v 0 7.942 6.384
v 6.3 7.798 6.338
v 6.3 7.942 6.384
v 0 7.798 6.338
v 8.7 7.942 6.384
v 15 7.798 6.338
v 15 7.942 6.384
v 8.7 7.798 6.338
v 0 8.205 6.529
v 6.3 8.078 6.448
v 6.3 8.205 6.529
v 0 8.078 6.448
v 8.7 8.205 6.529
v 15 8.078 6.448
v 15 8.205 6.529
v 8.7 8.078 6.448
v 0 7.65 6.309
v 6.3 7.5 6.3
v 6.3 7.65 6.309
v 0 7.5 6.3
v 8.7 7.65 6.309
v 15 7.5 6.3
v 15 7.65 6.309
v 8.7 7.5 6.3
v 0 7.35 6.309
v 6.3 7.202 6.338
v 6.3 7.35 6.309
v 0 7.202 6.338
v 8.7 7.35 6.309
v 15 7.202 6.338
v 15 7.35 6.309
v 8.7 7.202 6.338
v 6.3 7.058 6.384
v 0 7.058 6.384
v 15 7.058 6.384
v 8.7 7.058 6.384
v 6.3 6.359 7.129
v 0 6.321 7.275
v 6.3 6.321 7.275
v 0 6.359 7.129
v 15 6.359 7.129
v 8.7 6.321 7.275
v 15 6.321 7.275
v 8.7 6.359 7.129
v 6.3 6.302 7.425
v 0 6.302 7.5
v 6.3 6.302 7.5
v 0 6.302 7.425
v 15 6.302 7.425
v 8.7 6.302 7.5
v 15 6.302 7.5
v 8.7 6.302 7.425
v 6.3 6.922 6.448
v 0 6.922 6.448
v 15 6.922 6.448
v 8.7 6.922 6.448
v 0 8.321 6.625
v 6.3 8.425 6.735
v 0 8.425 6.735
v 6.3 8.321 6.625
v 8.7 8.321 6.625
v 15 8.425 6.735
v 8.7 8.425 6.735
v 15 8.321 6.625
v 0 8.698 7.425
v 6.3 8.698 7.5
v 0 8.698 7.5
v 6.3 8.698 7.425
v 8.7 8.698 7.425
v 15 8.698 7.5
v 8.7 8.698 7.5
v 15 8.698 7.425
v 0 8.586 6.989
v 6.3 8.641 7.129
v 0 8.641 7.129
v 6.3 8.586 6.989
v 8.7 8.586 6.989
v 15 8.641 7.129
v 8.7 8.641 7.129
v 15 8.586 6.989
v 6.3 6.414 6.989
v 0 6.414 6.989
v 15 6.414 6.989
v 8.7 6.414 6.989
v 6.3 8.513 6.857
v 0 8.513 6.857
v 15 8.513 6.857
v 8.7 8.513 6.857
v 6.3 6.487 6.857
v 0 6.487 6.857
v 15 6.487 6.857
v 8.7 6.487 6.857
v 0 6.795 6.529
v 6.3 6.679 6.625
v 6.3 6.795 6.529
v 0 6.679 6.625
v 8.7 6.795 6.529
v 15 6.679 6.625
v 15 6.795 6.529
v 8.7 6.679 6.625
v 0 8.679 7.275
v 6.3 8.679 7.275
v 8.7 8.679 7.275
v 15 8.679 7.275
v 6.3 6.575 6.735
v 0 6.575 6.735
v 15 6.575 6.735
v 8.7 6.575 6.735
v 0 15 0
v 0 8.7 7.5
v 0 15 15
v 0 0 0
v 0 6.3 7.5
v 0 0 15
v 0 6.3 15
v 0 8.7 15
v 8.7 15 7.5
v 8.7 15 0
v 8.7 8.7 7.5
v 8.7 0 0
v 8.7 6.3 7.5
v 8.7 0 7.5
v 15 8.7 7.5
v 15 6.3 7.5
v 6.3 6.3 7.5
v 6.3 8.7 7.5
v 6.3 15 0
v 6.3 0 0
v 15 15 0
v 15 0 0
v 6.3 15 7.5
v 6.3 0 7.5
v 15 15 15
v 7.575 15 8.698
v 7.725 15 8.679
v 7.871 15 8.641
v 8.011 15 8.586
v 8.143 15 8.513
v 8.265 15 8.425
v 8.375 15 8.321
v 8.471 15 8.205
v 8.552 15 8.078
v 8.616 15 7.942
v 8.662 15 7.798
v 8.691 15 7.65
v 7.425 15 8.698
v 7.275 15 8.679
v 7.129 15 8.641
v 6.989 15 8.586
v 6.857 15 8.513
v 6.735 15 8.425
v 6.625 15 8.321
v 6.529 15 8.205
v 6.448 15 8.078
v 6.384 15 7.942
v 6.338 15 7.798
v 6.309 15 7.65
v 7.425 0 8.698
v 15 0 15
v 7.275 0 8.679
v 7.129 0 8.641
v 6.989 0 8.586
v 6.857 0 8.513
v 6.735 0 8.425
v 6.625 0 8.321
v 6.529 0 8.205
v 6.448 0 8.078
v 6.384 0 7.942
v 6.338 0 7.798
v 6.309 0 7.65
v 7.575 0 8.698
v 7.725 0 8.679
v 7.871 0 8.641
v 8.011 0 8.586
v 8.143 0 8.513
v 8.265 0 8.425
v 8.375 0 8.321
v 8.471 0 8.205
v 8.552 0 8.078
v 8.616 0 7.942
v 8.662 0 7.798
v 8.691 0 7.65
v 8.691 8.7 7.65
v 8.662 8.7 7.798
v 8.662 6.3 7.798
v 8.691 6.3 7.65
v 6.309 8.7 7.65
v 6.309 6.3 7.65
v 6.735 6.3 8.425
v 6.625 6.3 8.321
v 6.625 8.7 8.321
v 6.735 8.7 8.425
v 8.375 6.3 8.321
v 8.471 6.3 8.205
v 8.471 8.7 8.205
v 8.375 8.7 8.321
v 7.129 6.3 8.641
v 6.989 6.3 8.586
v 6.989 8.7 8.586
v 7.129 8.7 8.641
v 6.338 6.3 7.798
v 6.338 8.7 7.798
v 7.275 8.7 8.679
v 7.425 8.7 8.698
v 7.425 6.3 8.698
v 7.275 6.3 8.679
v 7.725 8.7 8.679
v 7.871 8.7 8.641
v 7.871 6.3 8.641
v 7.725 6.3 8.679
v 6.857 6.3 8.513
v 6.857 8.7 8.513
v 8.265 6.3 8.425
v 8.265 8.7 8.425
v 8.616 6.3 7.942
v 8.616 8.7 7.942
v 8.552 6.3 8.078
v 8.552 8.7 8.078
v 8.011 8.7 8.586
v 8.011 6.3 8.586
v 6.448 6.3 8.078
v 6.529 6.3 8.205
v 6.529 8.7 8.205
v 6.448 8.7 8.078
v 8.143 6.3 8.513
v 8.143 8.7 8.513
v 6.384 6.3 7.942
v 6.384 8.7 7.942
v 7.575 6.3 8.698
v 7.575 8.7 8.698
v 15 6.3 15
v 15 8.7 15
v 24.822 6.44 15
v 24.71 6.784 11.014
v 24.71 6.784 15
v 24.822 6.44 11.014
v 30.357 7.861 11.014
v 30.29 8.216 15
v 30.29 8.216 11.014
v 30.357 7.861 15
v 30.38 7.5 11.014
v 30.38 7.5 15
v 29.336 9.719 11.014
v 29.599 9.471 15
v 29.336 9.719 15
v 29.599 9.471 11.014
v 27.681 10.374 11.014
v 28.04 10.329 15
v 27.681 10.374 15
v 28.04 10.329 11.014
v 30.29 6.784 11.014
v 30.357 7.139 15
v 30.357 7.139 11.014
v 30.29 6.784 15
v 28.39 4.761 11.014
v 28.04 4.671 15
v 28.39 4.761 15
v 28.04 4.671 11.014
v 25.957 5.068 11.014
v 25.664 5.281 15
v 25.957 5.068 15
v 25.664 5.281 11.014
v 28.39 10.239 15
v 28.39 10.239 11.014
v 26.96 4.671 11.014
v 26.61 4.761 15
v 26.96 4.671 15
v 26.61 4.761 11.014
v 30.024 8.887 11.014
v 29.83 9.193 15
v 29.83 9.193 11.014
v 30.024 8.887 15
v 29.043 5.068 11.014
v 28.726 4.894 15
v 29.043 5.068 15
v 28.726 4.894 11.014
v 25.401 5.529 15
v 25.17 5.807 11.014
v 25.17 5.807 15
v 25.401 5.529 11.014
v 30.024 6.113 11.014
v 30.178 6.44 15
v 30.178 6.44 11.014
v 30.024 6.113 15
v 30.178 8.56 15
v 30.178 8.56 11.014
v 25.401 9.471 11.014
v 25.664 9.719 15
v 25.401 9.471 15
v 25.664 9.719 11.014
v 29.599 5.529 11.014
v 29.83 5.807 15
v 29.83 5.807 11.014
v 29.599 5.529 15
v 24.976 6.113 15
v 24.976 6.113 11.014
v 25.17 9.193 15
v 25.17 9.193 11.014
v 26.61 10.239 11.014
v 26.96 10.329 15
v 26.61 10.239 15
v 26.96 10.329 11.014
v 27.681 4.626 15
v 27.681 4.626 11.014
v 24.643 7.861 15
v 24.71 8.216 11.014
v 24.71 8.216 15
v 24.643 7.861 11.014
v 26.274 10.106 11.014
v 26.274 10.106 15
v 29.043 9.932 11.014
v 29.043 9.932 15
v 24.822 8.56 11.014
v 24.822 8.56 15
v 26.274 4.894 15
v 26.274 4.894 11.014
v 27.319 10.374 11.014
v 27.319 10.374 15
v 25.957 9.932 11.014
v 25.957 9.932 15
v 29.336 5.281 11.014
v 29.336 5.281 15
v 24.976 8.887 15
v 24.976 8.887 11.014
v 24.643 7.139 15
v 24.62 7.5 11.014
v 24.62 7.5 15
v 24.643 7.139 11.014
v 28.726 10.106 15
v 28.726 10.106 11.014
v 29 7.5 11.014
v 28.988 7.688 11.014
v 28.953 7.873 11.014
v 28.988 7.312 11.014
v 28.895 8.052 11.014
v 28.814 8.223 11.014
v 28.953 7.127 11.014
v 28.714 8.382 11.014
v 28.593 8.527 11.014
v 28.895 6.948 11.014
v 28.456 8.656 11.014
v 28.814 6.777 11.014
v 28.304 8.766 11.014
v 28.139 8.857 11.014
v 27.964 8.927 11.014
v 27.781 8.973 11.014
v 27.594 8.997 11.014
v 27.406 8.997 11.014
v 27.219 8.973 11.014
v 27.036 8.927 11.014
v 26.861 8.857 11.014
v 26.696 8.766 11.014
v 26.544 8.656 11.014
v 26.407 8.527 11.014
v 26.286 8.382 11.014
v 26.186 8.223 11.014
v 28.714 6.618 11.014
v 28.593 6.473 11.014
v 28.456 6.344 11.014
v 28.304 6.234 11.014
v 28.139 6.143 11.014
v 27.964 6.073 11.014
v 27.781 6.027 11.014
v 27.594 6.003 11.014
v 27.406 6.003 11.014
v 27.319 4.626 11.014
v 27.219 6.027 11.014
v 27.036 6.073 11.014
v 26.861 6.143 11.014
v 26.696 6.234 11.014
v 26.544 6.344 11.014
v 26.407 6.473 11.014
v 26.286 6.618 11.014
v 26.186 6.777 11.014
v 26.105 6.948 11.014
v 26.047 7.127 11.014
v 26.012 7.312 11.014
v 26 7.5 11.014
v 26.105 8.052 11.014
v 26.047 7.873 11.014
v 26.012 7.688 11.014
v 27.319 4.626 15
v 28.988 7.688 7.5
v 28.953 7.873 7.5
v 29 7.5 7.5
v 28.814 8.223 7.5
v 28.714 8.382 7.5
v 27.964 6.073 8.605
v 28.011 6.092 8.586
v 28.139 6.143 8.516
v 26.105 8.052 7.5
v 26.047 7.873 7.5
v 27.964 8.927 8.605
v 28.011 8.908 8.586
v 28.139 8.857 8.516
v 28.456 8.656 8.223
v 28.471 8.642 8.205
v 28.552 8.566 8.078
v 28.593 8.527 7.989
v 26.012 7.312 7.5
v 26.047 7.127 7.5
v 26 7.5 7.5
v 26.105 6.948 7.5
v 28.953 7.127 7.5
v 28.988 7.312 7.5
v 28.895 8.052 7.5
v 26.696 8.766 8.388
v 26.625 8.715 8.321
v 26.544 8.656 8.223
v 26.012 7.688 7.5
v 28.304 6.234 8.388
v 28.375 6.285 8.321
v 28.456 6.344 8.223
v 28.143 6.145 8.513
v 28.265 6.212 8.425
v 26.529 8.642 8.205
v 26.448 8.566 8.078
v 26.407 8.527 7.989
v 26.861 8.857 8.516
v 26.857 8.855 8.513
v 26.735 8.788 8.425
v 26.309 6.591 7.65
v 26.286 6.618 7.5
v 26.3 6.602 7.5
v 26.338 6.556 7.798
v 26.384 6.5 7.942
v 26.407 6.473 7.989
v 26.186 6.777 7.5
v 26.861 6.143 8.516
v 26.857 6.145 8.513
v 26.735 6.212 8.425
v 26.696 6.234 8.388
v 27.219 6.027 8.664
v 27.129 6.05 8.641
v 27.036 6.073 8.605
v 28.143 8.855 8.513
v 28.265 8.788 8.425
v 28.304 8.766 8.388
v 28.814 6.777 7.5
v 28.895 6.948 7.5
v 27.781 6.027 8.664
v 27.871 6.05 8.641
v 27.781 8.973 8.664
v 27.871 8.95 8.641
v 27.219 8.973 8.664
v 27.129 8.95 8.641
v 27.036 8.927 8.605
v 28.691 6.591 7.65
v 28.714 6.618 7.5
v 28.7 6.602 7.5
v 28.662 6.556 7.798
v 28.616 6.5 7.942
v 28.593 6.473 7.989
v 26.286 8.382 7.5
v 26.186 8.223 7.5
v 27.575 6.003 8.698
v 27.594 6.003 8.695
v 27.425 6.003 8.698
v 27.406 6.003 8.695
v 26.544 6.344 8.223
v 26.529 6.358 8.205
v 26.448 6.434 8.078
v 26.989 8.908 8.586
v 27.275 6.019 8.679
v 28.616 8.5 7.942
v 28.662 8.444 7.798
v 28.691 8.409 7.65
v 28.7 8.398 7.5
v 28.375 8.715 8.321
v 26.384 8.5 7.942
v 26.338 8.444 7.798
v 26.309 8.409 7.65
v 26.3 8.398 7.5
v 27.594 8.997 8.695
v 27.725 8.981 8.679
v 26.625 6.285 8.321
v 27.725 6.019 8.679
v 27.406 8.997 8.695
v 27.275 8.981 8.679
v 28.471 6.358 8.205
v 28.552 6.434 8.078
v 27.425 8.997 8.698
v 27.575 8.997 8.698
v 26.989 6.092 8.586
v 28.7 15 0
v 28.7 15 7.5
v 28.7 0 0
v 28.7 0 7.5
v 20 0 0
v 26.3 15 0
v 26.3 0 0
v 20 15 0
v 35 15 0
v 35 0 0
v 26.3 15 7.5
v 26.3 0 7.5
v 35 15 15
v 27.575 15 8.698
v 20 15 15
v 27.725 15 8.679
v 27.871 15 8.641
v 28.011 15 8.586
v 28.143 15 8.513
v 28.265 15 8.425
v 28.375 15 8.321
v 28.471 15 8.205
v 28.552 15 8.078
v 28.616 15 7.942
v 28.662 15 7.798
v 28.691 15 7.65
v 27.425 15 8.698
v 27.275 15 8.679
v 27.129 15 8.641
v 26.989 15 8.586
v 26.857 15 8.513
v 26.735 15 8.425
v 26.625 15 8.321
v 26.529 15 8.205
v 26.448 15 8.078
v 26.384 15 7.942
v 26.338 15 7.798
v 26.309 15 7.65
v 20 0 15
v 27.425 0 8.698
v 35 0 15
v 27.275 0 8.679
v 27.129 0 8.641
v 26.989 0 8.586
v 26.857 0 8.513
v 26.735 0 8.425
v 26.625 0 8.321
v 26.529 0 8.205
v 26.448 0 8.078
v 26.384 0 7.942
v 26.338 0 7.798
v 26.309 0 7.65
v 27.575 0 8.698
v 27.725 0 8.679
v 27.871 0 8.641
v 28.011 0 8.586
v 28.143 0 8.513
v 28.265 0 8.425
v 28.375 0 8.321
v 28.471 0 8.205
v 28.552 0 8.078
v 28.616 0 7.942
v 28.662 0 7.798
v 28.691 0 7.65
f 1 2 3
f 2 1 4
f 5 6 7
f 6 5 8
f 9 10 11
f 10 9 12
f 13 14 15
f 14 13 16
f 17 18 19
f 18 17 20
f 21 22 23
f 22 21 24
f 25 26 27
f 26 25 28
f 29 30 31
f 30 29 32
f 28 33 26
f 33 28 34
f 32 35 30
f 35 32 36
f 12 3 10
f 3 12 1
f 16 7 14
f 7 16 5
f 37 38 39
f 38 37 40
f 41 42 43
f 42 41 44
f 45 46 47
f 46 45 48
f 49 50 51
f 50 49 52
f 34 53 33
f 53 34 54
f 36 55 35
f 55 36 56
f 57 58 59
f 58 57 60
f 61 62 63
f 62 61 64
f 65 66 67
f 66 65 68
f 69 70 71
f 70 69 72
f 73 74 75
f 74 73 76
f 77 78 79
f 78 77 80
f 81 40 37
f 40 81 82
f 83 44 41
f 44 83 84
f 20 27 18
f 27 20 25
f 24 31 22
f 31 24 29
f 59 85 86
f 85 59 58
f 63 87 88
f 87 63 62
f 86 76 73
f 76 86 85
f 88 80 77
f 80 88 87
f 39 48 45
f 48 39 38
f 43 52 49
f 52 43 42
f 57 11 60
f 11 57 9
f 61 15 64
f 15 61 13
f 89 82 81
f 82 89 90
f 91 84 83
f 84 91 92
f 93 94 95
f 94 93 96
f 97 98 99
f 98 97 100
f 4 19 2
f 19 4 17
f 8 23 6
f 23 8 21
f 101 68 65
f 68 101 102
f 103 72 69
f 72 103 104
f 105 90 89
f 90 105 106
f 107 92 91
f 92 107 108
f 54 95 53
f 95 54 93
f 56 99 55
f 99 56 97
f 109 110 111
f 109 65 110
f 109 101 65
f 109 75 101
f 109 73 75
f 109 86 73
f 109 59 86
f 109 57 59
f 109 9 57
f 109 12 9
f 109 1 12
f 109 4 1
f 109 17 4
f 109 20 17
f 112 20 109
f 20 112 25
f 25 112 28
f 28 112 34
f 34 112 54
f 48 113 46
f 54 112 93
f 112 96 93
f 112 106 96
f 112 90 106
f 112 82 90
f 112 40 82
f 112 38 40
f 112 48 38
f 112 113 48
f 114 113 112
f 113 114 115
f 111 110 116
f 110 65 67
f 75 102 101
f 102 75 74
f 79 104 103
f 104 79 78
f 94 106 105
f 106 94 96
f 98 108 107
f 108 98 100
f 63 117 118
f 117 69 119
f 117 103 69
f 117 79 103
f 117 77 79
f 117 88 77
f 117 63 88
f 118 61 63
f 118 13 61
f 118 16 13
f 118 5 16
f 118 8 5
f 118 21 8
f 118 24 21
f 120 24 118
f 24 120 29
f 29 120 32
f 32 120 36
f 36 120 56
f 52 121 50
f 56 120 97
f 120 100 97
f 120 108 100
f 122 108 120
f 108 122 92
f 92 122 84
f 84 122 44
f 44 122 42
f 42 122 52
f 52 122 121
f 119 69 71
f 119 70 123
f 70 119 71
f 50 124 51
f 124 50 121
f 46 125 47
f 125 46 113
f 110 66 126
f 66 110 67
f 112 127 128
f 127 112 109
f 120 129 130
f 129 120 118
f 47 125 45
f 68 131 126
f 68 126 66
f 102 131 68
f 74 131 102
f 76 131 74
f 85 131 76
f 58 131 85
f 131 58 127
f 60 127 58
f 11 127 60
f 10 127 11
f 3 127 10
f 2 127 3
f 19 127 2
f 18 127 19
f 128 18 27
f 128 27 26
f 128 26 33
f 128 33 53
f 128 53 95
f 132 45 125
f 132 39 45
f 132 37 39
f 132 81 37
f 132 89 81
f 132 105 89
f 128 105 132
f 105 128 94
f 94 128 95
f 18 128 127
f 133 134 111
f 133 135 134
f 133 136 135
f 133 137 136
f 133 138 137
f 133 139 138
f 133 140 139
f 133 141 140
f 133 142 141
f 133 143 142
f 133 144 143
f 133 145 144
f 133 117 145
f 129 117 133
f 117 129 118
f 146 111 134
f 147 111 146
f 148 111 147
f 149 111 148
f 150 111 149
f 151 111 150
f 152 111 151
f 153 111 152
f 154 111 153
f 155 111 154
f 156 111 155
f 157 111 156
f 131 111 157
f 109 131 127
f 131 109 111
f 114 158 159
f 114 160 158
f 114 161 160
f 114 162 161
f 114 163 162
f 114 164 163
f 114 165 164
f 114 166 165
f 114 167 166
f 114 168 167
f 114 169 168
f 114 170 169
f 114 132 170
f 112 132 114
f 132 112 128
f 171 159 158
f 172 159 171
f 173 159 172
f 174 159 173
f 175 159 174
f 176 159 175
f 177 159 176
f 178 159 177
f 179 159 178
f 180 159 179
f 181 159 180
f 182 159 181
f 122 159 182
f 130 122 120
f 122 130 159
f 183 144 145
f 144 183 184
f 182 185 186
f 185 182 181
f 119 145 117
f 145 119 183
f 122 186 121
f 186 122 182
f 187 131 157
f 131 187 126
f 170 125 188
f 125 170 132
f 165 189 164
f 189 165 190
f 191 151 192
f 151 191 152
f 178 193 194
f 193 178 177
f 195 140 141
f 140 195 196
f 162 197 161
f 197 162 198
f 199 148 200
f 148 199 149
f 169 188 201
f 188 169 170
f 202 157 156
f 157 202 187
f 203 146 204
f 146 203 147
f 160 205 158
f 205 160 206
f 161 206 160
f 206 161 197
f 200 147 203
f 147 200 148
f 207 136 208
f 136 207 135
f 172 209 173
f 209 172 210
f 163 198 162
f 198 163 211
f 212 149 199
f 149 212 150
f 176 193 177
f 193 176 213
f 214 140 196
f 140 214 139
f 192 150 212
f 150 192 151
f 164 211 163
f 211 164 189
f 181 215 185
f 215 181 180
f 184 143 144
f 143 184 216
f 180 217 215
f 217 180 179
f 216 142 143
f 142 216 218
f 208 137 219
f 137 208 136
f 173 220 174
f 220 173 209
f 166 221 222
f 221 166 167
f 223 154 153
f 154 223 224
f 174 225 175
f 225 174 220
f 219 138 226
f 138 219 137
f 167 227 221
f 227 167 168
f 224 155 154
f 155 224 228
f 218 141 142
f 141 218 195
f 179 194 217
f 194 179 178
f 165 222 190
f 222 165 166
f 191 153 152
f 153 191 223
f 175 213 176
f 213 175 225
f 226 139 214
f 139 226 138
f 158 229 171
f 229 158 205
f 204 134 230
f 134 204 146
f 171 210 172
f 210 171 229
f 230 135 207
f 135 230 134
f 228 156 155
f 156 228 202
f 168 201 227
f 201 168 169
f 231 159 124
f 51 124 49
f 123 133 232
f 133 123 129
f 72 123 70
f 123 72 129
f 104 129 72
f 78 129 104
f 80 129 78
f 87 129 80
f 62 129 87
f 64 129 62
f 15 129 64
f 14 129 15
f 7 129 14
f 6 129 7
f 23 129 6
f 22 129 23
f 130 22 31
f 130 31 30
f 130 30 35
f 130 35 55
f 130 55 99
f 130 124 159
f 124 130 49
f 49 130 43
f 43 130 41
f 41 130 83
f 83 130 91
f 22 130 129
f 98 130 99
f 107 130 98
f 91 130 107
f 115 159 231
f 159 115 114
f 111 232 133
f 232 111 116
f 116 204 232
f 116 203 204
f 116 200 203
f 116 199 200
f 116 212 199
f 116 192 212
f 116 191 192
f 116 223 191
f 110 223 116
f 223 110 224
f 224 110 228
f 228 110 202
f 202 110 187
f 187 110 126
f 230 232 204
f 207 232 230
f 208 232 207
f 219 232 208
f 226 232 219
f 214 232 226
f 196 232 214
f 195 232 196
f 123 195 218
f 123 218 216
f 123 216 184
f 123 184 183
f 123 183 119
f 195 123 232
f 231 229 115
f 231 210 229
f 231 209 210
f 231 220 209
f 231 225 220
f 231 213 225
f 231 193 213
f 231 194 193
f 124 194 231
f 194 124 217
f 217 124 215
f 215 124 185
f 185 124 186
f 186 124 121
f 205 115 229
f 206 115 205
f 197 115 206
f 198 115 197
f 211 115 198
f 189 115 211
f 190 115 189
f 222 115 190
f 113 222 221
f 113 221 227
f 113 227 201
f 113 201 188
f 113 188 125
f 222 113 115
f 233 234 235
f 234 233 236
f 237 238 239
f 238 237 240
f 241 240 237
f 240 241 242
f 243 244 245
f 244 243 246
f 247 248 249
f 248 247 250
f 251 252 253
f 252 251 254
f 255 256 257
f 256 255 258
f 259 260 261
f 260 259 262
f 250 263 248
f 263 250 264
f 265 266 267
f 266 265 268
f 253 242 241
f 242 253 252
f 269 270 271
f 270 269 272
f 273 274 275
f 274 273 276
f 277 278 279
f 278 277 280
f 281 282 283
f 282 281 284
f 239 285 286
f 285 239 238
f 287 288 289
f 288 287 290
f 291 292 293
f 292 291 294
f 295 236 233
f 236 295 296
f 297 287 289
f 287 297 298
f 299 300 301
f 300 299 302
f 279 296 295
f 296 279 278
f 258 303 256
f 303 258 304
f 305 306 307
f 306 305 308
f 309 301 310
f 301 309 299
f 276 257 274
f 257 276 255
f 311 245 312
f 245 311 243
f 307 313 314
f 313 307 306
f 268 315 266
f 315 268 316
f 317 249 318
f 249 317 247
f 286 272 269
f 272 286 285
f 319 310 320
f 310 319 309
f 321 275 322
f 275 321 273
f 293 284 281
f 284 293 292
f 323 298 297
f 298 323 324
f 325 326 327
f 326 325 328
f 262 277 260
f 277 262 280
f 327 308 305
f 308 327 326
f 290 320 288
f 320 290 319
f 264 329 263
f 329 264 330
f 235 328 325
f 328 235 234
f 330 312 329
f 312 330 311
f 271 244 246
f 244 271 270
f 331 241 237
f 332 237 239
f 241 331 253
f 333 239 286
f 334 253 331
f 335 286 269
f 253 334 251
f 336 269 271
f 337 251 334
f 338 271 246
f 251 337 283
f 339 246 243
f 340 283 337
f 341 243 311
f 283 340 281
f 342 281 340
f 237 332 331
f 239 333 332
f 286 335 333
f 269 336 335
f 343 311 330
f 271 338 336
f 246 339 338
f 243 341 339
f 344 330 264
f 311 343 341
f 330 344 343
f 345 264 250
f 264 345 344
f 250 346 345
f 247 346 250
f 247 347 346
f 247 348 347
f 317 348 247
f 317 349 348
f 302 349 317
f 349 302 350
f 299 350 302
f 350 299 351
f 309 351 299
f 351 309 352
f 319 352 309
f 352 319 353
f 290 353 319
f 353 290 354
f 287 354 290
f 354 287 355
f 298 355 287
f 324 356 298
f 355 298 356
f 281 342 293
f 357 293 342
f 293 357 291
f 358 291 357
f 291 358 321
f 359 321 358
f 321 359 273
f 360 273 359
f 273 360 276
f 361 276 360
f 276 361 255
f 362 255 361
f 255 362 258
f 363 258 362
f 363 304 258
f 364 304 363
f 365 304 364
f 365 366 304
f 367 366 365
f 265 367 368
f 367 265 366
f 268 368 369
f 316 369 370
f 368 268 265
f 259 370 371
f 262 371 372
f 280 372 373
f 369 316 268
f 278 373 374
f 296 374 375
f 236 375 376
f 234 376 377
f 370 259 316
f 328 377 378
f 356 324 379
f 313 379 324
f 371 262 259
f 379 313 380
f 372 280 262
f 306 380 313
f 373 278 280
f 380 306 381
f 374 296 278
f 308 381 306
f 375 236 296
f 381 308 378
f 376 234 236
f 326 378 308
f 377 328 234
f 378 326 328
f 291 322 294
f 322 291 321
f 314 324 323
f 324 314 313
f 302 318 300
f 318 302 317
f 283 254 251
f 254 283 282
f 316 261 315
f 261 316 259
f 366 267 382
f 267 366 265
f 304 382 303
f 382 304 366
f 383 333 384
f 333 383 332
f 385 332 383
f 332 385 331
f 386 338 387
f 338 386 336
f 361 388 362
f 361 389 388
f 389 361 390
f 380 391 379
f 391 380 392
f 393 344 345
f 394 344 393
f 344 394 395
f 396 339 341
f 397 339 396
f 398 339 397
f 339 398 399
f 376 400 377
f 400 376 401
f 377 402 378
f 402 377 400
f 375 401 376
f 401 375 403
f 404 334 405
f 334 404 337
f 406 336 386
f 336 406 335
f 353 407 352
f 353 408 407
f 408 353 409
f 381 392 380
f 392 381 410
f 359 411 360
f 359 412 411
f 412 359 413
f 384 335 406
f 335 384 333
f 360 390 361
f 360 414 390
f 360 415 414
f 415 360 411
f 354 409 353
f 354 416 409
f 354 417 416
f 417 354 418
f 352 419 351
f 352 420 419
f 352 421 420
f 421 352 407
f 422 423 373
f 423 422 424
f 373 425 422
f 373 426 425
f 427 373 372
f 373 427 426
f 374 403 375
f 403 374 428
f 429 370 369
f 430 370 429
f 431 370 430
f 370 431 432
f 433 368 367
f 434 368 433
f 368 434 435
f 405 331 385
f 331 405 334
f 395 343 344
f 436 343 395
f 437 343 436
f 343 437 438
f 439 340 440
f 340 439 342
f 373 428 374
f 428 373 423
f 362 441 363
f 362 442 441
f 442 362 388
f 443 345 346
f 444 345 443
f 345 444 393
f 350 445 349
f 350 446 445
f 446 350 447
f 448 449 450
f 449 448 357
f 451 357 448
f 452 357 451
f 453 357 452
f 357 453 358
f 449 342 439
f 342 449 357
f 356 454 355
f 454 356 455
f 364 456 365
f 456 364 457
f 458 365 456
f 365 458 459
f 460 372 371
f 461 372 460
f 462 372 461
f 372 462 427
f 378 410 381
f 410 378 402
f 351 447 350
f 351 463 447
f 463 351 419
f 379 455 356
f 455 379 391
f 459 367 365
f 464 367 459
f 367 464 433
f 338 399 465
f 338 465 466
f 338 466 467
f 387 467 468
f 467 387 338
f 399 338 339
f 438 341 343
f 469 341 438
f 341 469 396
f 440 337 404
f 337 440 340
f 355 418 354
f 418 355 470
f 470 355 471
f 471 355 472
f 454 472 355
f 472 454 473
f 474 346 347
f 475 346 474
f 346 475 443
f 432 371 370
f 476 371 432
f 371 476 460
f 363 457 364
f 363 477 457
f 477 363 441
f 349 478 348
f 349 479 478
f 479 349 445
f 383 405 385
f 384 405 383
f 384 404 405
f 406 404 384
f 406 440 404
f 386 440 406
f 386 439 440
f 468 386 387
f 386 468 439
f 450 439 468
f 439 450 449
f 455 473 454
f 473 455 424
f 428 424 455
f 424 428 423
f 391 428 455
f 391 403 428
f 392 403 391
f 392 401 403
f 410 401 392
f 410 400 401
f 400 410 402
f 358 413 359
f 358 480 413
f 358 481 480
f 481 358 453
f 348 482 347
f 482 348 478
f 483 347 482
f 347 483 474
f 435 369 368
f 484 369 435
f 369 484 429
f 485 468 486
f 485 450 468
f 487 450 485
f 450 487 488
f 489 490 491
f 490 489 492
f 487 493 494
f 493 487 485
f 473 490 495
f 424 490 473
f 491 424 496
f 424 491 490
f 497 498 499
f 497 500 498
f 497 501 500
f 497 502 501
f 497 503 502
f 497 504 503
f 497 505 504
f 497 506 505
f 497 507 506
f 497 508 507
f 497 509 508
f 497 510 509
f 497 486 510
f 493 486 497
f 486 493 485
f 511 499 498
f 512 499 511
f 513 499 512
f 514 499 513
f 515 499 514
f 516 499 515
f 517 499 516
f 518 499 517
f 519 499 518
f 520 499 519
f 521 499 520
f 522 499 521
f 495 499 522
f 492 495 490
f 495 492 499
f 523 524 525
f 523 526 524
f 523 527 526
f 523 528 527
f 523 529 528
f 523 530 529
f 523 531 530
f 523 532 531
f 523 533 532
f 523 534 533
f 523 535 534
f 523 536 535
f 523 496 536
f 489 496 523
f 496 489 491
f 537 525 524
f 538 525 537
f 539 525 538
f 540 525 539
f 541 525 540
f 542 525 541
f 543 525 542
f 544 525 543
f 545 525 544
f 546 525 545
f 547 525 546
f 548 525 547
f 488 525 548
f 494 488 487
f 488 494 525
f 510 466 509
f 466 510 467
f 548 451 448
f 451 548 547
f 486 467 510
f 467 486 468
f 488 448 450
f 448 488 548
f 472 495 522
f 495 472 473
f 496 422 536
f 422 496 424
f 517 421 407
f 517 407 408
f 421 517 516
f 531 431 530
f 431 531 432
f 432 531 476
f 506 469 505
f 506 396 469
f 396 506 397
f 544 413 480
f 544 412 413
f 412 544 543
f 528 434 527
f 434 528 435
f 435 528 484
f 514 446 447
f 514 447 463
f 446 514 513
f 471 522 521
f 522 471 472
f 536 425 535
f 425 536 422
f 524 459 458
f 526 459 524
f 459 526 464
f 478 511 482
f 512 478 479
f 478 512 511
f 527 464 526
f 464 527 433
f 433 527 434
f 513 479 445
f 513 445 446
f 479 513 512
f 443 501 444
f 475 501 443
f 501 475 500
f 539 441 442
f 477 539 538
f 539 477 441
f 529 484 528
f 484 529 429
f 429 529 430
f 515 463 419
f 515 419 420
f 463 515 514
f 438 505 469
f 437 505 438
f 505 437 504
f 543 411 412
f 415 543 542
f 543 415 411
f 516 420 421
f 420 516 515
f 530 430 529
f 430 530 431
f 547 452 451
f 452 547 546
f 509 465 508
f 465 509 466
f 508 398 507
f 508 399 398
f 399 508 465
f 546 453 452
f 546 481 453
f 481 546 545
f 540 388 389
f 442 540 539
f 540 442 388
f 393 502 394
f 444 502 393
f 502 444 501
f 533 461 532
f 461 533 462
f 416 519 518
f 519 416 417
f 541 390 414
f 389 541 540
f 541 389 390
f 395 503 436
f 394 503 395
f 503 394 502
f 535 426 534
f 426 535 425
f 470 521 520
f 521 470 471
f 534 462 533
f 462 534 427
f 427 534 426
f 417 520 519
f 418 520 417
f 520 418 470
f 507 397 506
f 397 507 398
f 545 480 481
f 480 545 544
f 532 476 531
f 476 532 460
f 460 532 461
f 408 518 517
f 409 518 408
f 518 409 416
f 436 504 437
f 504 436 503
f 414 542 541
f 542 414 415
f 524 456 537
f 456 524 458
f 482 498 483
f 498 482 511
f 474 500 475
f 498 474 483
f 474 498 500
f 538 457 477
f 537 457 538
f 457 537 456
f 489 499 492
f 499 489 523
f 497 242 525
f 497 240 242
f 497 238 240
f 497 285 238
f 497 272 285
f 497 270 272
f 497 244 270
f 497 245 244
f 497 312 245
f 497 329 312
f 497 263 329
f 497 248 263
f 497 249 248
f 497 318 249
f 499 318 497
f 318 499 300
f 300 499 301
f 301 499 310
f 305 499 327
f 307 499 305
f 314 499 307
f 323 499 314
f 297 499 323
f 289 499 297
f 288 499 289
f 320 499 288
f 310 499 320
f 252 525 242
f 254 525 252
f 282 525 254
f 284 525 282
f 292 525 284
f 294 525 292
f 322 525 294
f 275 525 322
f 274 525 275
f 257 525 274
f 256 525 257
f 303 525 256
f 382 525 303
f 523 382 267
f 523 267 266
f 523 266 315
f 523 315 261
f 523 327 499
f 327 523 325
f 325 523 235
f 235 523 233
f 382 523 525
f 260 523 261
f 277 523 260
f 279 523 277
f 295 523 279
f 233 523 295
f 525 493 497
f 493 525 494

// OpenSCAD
//These are the midle cubes of the snake, print as many as you like of these


// Show me an end or middle cube (or Both)
show_cubes = "Both"; // [Middle,End,Both]

// How big should the cube  be?
cube = 15; // [10:30]


// How big should the hole be? (I'm using 2mm cord, so have set the hole to 2.4mm)
elastichole = 2.4; 


$fn = 50;



module base() {
    hull(){
        translate([0,0,0])
        cube([cube,cube,cube],center = false);    
    }   
}


module holes_Middle() {
    rotate([0,90,0])
    translate([-cube/2,cube/2,0])
    cylinder(h = cube+1, d = elastichole, center = false);

    translate([cube/2-elastichole/2,0,0])
    cube([elastichole,cube,cube/2],center = false);    

    rotate([90,0,0])
    translate([cube/2,cube/2,-cube])
    cylinder(h = cube, d = elastichole, center = false);

    translate([0,cube/2-elastichole/2,cube/2])
    cube([cube,elastichole,cube/2],center = false);    
}




module holes_end() {

//Top hole for the knot (I've made it 2.4 times bigger than the cord hole    
    translate([cube/2,cube/2,cube-cube/3.5+0.3])
    cylinder(h = cube/3.5, d = elastichole*2.4, center = false);

//I've made the hole for the cord 0.6 bigger so the cord goes through easily
    translate([cube/2,cube/2,7.5])
    cylinder(h = cube, d = elastichole+.6, center = false);


    translate([cube/2-elastichole/2,0,0])
    cube([elastichole,cube,cube/2],center = false);    



    rotate([90,0,0])
    translate([cube/2,cube/2,-cube])
    cylinder(h = cube, d = elastichole, center = false);

}


module Middlecube() {
difference(){
    base();
    holes_Middle();
}
}

module Endcube() {
difference(){
    base();
    holes_end();
}
}


if (show_cubes == "Both") {

Middlecube();

translate([cube+5,0,0])
Endcube();
    
}

if (show_cubes == "Middle") {

Middlecube();


    
}

if (show_cubes == "End") {


Endcube();
    
} 

// preview[view:south, tilt:top]
